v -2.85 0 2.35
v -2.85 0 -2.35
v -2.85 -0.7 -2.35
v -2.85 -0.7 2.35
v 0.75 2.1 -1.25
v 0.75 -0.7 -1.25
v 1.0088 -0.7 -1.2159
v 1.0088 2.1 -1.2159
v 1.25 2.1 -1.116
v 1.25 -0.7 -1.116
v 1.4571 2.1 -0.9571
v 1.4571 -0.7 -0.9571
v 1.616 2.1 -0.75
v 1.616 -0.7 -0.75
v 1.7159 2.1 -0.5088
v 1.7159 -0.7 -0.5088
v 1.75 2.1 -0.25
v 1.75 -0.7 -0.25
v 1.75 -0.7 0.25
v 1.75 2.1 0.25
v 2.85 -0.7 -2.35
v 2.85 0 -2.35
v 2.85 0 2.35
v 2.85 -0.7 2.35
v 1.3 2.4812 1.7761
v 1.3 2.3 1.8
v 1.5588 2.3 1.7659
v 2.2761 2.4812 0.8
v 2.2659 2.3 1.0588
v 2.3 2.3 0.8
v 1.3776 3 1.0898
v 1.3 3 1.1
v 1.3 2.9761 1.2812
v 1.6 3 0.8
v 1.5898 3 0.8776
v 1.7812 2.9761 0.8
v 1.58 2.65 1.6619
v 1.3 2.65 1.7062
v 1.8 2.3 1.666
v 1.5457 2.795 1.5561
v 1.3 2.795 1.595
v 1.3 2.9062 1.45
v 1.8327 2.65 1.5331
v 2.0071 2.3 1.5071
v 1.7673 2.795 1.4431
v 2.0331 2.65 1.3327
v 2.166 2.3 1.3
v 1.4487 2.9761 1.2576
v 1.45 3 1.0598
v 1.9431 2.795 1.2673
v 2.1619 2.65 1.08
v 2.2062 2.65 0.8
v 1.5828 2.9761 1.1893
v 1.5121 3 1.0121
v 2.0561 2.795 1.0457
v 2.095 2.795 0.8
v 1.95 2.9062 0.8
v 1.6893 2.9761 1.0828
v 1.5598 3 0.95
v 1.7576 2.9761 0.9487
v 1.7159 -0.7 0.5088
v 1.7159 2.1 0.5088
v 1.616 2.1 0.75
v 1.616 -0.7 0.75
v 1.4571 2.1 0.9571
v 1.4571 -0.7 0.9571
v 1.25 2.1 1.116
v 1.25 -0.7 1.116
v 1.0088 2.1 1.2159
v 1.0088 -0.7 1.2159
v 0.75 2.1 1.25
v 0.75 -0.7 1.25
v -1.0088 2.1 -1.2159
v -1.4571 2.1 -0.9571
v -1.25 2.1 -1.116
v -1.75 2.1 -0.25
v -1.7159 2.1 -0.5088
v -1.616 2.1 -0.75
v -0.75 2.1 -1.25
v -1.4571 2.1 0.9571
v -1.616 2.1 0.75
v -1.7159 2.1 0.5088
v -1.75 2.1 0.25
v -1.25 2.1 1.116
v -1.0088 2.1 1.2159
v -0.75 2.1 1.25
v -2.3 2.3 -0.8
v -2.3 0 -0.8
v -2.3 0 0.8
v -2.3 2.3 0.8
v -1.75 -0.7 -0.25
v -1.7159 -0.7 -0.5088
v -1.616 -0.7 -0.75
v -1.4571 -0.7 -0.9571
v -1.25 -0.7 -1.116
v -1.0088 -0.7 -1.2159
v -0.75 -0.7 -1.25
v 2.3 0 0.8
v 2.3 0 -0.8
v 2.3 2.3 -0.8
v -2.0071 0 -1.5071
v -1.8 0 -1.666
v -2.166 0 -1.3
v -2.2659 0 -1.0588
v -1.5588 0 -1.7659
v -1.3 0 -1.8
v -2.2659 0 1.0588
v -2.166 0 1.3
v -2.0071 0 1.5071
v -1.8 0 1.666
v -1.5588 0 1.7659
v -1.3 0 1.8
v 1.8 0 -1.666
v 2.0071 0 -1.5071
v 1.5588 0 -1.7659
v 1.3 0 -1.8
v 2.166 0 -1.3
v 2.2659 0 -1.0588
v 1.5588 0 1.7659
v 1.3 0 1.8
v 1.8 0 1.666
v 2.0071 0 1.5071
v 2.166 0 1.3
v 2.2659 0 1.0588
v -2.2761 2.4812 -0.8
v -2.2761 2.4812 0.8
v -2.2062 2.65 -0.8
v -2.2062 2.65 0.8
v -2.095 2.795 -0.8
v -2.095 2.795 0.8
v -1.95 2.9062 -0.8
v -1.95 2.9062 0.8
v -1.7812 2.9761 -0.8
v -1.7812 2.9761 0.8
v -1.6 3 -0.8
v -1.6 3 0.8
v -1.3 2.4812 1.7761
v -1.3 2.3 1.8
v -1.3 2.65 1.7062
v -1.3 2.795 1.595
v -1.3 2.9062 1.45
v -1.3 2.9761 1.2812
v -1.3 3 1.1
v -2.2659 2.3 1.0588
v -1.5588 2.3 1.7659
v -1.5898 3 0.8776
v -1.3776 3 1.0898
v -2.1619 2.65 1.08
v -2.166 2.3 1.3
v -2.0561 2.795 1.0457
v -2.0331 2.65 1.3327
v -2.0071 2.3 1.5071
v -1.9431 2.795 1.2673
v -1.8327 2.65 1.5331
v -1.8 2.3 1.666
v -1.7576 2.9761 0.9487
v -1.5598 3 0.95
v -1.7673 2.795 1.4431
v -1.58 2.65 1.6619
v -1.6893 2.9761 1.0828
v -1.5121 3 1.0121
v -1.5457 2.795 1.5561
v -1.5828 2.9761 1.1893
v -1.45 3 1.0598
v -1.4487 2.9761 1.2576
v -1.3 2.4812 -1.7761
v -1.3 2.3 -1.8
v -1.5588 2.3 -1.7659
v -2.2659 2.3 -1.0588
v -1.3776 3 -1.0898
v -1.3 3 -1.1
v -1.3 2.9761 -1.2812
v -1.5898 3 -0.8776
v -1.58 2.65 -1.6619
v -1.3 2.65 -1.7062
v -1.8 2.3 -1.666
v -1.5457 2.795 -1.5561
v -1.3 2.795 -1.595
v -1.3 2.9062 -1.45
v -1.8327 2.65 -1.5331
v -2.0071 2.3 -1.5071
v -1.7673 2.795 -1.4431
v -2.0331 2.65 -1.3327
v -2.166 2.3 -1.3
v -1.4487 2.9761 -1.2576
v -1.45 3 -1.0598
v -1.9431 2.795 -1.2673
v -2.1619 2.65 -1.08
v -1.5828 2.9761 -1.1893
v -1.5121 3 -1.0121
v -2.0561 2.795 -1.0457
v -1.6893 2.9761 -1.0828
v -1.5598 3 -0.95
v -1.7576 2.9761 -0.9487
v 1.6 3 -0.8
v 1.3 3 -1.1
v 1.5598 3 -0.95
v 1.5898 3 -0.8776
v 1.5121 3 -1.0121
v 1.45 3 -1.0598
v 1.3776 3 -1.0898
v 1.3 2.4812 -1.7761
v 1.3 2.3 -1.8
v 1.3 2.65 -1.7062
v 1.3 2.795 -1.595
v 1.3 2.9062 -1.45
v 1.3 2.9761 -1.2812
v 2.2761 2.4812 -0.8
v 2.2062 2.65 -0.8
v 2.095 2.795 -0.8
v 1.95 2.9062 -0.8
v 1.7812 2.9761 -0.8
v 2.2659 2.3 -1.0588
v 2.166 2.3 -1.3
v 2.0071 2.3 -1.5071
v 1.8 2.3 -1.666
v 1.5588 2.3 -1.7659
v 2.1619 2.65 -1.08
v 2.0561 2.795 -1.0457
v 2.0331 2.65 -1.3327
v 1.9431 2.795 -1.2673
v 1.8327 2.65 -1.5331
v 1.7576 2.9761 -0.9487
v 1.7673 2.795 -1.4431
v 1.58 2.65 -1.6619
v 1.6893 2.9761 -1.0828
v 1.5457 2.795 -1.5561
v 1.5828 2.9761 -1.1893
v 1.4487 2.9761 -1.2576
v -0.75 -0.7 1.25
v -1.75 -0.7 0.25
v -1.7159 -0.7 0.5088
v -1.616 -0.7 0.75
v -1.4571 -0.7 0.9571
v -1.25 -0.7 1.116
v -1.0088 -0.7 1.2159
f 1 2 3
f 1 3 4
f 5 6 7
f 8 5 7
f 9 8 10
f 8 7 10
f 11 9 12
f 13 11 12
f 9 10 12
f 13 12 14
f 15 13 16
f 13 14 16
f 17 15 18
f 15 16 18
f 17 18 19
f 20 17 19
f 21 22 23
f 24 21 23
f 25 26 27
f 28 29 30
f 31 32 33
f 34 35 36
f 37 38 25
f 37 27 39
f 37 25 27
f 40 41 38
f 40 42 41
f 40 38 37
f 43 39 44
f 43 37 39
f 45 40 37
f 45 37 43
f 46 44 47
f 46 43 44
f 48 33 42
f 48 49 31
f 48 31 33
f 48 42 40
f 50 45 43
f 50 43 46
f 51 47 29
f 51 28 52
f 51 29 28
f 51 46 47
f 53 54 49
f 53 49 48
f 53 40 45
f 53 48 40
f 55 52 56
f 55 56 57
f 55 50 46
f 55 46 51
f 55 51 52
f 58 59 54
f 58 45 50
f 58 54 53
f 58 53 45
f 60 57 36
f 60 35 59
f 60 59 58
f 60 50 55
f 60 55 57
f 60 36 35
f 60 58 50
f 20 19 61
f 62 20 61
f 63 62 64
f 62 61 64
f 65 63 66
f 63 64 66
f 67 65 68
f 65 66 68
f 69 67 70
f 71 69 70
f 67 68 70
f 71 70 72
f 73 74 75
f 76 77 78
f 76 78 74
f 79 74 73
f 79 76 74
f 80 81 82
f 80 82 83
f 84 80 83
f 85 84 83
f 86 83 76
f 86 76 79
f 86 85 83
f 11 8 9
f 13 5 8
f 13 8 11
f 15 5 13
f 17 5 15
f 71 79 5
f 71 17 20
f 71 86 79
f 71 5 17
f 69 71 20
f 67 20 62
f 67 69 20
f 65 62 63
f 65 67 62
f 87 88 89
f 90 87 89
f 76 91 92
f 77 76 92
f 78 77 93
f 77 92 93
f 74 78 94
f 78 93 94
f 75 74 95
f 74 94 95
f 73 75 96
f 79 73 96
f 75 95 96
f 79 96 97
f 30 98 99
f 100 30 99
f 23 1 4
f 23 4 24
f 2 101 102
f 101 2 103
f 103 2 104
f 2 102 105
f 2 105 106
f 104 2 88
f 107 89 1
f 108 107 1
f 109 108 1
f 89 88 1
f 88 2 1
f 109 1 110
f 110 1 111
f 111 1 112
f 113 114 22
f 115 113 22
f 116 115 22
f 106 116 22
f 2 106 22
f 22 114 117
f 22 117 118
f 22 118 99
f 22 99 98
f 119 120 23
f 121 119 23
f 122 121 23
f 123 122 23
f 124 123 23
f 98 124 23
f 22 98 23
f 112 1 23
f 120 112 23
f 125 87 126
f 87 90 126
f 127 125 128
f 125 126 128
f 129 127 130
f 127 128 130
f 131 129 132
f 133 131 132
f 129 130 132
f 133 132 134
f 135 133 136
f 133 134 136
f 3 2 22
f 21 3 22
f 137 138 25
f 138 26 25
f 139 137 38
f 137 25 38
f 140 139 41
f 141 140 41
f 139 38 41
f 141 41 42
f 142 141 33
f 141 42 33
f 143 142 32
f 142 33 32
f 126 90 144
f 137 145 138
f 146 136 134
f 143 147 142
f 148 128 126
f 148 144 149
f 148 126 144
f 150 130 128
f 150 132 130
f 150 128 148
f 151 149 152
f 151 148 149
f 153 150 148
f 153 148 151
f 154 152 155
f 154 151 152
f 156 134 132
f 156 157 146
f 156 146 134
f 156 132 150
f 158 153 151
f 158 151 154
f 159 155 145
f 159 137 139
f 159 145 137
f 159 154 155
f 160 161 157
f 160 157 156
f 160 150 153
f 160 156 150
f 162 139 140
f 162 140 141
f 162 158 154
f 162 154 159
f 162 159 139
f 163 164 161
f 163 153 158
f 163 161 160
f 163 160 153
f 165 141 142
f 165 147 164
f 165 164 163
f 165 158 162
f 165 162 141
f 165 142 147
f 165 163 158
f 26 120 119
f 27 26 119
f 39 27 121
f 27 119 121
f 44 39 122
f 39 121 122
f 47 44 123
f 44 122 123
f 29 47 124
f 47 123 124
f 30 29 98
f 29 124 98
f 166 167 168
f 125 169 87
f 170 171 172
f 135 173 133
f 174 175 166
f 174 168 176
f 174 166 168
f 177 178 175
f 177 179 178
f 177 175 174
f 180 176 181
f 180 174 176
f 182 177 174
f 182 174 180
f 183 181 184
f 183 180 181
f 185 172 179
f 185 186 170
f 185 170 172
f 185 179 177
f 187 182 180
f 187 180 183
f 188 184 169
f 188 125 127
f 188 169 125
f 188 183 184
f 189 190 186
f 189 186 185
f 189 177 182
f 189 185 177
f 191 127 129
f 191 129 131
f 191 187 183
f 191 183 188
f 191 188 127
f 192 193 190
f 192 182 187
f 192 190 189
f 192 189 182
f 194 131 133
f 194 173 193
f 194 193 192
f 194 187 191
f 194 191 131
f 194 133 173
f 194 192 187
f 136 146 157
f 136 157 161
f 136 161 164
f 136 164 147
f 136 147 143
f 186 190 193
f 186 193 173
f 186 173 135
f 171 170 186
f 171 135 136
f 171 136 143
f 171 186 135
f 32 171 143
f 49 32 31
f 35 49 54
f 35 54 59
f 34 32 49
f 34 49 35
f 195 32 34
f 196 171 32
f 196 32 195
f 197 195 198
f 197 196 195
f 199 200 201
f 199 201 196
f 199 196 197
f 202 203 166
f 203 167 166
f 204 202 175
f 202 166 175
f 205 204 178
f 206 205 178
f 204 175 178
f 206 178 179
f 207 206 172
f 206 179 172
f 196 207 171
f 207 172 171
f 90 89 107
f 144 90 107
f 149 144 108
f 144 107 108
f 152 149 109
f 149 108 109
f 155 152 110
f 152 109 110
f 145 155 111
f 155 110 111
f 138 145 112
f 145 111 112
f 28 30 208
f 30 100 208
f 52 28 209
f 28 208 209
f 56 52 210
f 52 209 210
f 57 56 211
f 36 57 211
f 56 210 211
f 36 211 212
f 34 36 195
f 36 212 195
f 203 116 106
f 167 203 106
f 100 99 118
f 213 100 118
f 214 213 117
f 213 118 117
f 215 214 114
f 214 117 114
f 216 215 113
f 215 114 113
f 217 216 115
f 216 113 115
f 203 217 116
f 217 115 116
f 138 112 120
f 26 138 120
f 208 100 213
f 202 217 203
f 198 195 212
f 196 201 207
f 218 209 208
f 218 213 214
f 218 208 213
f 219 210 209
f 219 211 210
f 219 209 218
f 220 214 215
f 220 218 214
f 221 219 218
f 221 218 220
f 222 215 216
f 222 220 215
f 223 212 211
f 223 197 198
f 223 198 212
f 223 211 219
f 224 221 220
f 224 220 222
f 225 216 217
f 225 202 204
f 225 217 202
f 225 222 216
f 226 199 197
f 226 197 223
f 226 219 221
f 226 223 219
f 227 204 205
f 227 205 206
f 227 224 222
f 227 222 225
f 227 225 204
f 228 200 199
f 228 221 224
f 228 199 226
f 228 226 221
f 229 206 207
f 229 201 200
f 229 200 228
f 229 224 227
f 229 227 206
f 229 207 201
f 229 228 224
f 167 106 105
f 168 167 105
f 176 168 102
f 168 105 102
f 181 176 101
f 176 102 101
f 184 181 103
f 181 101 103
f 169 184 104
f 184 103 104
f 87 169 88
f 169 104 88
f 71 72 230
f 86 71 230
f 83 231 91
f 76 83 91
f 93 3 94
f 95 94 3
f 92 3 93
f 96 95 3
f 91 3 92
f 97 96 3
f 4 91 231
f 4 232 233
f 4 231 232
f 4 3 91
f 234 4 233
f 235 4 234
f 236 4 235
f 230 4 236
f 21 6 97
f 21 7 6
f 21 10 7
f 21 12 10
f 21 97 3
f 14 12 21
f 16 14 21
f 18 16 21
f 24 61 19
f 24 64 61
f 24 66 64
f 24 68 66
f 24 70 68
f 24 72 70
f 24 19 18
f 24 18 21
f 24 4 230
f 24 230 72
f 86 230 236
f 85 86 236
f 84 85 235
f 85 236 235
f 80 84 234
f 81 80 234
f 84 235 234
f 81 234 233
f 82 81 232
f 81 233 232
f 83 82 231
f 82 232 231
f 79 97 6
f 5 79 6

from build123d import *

# Parameters (mm, degrees)
EXTRUDE_332_DEPTH     = 3
SKETCH_2_W            = 5.7
SKETCH_2_H            = 4.7
EXTRUDE_566_DEPTH     = 0.7
CUT_EXTRUDE_806_DEPTH = 2.8
FILLET_1_R            = 0.7


with BuildPart() as part:
    # 草图1 → Extrude 332 (new body)
    with BuildSketch(Plane(origin=(0, 0, 0), x_dir=(1, 0, 0), z_dir=(0, 1, 0))):
        with BuildLine():
            Line((-1.3, -1.8), (1.3, -1.8))
            ThreePointArc((1.3, -1.8), (2.007106781, -1.507106781), (2.3, -0.8))
            Line((2.3, -0.8), (2.3, 0.8))
            ThreePointArc((2.3, 0.8), (2.007106781, 1.507106781), (1.3, 1.8))
            Line((1.3, 1.8), (-1.3, 1.8))
            ThreePointArc((-1.3, 1.8), (-2.007106781, 1.507106781), (-2.3, 0.8))
            Line((-2.3, 0.8), (-2.3, -0.8))
            ThreePointArc((-2.3, -0.8), (-2.007106781, -1.507106781), (-1.3, -1.8))
        make_face()
    extrude(amount=EXTRUDE_332_DEPTH)

    # 草图2 → Extrude 566 (add)
    with BuildSketch(Plane.XZ):
        Rectangle(SKETCH_2_W, SKETCH_2_H)
    extrude(amount=EXTRUDE_566_DEPTH)

    # 草图3 → Cut-Extrude 806 (cut)
    with BuildSketch(Plane.XZ.offset(0.7)):
        with BuildLine():
            Line((-0.75, -1.25), (0.75, -1.25))
            ThreePointArc((0.75, -1.25), (1.457106781, -0.957106781), (1.75, -0.25))
            Line((1.75, -0.25), (1.75, 0.25))
            ThreePointArc((1.75, 0.25), (1.457106781, 0.957106781), (0.75, 1.25))
            Line((0.75, 1.25), (-0.75, 1.25))
            ThreePointArc((-0.75, 1.25), (-1.457106781, 0.957106781), (-1.75, 0.25))
            Line((-1.75, 0.25), (-1.75, -0.25))
            ThreePointArc((-1.75, -0.25), (-1.457106781, -0.957106781), (-0.75, -1.25))
        make_face()
    extrude(amount=-CUT_EXTRUDE_806_DEPTH, mode=Mode.SUBTRACT)

    # 圆角1
    fillet_1_edges = [part.edges().sort_by_distance(p)[0] for p in [
        (2.007106781, 3, -1.507106781),
        (0, 3, -1.8),
        (-2.007106781, 3, -1.507106781),
        (-2.3, 3, 0),
        (-2.007106781, 3, 1.507106781),
        (0, 3, 1.8),
        (2.007106781, 3, 1.507106781),
        (2.3, 3, 0),
    ]]
    fillet(fillet_1_edges, radius=FILLET_1_R)


solid = part.part
